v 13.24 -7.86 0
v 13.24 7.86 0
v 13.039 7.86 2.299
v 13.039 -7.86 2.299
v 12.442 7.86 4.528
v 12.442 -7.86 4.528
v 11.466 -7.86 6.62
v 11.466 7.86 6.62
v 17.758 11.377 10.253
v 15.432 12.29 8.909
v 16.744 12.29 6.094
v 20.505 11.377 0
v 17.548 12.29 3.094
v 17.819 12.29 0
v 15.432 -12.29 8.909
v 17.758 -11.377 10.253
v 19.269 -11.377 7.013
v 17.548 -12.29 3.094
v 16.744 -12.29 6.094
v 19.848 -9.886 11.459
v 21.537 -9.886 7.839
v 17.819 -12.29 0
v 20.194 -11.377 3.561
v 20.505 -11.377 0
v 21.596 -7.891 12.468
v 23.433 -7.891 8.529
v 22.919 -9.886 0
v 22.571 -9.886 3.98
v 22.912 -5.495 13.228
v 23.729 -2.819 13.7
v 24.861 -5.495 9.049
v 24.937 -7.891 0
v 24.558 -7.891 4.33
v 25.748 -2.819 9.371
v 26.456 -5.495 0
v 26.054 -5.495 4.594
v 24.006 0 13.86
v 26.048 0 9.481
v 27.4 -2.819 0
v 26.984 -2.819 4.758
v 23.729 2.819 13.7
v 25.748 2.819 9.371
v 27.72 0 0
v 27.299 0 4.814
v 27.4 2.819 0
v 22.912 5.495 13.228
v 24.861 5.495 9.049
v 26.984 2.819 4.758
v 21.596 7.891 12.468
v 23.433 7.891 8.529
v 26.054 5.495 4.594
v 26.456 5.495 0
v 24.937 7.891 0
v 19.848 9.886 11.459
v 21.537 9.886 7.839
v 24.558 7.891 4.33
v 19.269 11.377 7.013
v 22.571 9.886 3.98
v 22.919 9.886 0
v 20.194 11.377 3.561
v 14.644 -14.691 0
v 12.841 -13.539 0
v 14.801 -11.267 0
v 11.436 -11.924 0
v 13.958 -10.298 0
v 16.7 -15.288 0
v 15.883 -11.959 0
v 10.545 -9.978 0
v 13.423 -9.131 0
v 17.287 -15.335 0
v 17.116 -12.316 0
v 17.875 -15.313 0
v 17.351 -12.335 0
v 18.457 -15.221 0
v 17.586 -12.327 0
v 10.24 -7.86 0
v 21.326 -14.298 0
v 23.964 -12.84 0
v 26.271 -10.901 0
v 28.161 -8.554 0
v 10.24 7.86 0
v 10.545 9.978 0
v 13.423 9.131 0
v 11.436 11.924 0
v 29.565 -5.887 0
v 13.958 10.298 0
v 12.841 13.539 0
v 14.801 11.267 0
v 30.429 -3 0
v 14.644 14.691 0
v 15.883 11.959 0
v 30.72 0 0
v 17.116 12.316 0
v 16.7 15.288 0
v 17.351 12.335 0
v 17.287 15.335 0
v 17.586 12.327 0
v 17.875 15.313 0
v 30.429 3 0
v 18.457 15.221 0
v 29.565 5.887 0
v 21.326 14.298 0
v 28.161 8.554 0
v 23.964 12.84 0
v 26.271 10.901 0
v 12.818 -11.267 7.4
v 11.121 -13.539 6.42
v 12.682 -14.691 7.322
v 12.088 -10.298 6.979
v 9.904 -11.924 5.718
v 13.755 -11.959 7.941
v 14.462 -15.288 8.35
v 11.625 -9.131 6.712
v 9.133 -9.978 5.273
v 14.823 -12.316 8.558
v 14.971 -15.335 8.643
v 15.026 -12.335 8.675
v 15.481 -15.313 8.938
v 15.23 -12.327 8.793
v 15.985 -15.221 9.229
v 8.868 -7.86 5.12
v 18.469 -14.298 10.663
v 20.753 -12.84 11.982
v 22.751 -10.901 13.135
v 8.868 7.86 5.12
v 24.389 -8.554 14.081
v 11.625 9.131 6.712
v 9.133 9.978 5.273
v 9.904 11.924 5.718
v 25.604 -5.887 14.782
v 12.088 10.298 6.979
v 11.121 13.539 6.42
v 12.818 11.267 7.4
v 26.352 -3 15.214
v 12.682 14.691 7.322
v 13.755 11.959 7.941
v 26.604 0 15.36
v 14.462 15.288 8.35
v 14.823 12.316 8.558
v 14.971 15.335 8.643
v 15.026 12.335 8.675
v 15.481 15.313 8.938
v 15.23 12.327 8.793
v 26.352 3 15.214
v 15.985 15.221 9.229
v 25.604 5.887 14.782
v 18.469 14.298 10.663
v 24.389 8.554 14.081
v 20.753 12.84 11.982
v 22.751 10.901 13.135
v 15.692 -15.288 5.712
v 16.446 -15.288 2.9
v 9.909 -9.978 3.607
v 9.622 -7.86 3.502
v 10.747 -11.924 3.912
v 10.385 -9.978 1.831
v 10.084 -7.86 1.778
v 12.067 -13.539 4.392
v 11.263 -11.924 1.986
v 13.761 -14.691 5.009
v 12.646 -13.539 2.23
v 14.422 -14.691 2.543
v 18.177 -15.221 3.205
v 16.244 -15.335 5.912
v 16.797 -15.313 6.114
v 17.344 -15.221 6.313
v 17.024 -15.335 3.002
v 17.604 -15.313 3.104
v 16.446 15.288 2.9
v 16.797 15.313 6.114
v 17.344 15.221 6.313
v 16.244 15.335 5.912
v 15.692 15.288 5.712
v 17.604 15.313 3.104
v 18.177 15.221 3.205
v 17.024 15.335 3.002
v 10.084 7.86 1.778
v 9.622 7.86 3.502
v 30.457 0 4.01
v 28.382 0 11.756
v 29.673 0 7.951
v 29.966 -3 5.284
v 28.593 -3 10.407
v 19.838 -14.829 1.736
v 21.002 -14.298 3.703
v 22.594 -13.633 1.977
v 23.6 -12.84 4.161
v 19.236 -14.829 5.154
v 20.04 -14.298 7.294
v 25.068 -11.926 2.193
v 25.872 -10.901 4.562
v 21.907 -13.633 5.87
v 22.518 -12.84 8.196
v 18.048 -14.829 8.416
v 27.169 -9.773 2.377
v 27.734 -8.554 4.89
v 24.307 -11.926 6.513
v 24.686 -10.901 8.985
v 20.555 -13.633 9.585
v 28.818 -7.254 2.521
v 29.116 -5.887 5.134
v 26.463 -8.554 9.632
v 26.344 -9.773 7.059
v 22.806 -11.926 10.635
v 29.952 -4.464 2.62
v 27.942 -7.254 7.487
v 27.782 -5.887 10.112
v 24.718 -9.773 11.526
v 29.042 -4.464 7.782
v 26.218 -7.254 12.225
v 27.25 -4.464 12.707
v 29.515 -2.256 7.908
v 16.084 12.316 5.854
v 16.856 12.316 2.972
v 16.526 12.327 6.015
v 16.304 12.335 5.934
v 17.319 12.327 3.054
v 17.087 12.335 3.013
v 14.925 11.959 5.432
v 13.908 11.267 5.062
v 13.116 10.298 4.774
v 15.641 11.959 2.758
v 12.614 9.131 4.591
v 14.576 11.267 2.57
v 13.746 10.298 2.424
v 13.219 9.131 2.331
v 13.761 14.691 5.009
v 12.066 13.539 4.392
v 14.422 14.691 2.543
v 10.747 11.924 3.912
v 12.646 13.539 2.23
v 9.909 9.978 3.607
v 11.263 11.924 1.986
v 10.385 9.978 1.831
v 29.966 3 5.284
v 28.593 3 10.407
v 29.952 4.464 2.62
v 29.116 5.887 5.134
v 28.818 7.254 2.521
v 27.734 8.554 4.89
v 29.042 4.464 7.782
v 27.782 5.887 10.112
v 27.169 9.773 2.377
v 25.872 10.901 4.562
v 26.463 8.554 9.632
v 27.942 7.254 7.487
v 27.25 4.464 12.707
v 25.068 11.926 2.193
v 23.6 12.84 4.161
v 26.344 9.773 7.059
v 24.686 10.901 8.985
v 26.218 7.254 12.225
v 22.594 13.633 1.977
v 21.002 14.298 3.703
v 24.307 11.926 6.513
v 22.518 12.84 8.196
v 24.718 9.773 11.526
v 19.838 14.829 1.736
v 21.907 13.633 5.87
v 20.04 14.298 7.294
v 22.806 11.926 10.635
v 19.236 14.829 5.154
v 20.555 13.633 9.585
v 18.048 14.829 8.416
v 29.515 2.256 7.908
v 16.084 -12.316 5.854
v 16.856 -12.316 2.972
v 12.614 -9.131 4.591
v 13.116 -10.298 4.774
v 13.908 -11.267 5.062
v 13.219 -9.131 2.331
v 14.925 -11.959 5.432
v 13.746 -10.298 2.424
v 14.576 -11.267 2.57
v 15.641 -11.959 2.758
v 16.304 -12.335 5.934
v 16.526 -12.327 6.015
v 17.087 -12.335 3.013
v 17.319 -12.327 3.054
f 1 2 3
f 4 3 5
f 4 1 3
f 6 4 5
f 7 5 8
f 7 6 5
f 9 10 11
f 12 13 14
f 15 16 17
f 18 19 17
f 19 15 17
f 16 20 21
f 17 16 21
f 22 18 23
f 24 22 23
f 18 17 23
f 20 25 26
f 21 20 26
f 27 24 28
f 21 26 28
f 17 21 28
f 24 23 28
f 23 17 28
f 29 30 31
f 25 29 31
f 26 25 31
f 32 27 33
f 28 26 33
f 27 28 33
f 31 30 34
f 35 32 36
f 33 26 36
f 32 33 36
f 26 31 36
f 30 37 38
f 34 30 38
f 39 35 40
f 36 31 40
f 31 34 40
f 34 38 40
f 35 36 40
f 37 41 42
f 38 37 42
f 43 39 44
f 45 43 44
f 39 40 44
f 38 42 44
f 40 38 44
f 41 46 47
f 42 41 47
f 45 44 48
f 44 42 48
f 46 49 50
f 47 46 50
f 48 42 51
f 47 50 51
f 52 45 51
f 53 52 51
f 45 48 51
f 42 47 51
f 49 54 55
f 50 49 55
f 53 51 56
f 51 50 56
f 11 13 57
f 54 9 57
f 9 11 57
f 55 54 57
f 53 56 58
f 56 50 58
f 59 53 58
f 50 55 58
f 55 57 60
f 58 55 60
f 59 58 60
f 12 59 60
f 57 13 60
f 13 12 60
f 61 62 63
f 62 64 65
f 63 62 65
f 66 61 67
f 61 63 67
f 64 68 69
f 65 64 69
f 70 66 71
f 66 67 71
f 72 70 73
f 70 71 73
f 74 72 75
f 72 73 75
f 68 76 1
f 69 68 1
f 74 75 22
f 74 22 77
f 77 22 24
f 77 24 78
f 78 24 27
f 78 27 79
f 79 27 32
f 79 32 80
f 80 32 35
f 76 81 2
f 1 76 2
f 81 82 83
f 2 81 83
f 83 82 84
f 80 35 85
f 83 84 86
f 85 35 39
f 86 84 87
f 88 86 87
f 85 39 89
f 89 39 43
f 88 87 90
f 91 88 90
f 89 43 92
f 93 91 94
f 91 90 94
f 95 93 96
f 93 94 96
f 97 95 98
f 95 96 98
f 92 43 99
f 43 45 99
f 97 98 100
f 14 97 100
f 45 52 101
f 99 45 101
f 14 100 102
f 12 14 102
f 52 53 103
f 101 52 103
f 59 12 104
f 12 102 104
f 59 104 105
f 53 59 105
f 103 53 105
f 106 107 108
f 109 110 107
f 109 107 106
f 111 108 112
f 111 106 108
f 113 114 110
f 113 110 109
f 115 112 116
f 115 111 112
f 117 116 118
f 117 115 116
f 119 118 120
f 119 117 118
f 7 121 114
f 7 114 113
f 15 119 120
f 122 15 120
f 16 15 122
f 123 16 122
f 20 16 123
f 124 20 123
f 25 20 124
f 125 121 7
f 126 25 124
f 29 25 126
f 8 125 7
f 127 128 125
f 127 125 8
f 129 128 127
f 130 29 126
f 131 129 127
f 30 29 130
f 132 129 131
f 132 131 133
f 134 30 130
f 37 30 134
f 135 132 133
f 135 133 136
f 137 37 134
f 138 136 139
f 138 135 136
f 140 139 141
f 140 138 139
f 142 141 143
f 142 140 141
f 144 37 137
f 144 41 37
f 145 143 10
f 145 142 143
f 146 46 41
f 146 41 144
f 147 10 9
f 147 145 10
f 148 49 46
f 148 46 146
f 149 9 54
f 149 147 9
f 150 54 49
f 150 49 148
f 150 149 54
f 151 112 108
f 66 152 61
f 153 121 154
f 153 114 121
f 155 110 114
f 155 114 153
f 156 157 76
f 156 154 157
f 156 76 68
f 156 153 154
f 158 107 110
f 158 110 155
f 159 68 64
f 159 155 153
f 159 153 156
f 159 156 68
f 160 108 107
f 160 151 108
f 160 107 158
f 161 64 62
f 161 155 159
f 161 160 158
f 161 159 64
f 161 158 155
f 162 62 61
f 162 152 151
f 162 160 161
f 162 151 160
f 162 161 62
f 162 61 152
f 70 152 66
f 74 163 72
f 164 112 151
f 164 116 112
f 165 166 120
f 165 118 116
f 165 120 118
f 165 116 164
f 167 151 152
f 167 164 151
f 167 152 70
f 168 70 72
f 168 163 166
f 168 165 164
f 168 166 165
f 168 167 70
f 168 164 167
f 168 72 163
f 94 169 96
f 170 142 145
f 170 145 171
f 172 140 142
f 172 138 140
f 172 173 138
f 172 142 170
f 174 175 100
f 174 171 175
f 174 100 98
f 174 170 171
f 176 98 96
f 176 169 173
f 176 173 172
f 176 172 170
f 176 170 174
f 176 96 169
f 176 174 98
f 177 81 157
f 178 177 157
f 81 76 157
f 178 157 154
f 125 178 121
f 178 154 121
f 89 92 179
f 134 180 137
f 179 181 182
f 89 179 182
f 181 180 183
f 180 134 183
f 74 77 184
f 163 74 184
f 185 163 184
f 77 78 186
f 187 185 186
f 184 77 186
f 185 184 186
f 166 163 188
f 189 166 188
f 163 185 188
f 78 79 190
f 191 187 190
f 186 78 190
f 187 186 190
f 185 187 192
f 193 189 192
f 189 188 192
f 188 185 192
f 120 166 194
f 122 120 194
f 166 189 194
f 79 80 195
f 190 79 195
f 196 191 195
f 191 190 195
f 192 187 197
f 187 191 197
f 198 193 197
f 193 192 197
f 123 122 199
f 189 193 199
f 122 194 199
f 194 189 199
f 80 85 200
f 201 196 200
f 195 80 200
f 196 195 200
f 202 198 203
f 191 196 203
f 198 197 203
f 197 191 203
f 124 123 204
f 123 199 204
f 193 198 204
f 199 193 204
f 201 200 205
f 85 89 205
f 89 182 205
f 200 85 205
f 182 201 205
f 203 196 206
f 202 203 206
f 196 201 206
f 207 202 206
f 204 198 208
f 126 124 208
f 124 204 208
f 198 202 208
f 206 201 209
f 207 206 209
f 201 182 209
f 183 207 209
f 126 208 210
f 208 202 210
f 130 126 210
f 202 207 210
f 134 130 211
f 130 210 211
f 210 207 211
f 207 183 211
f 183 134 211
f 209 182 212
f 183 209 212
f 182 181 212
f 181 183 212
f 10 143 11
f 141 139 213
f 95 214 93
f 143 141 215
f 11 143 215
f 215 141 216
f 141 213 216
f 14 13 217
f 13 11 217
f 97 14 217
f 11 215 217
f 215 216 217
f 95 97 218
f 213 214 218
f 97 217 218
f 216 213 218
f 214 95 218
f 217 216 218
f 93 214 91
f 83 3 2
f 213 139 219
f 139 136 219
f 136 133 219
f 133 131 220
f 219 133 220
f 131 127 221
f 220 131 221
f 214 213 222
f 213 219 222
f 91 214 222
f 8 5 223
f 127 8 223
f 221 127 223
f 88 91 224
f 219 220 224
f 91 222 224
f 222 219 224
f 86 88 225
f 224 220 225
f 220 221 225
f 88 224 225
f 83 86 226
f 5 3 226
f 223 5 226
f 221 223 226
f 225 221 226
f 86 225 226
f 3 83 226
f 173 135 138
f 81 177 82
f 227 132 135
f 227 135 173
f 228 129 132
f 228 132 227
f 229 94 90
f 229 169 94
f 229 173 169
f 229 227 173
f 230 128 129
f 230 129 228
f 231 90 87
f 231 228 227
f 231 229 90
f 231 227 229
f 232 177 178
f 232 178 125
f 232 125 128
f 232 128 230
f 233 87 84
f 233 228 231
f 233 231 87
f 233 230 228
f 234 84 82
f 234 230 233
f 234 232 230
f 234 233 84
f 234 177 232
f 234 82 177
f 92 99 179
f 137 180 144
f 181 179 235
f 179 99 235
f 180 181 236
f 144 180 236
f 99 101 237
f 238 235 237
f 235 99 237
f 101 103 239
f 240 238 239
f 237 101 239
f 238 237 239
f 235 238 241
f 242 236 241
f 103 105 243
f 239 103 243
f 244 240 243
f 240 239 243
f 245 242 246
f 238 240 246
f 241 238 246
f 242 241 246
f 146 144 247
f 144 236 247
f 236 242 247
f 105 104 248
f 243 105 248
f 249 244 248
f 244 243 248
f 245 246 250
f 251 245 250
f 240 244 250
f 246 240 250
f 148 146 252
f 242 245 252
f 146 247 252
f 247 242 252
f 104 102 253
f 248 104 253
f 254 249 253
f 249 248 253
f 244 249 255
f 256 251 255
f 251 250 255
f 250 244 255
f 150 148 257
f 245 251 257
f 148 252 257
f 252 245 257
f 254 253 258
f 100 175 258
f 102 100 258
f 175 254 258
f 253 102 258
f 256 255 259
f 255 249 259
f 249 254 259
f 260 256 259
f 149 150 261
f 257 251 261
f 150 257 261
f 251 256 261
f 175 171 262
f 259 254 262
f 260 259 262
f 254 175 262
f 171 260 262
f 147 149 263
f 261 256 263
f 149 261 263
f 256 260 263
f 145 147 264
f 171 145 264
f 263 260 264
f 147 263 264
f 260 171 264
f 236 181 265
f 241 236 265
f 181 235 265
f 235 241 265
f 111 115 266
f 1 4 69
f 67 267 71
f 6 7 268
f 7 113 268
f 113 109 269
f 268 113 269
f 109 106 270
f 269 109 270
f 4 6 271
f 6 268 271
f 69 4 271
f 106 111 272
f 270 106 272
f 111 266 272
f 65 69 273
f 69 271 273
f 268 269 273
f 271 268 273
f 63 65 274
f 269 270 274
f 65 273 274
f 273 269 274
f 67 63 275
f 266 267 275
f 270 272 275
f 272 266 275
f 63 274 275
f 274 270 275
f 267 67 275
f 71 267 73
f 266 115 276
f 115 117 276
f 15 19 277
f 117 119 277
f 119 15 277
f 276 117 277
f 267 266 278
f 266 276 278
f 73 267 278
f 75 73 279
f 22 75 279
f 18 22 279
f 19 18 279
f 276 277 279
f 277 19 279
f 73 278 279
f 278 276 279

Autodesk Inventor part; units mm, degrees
ref_plane "Work Plane2" through (0, 0, 0) normal (-0.2588, 0, -0.9659) x (0, 1, 0)
ref_plane "Work Plane1" through (-7, 0, -29.5697) normal (1, 0, 0) x (0, 0, -1)
ref_plane "YZ Plane" through (0, 0, 0) normal (1, 0, 0) x (0, 1, 0)
sketch "Sketch1" plane through (0, 0, 0) normal (0, 0, 1) x (1, 0, 0)
  line L0 (0, 0) -> (0, 15.36) construction
  line L1 (10.24, 7.86) -> (10.24, -7.86)
  line L2 (17.74, 15.36) -> (17.74, -15.36) construction
  arc A0 (16.6996, 15.2875) -> (10.24, 7.86) centre (17.74, 7.86) ccw
  arc A1 (10.24, -7.86) -> (16.6996, -15.2875) centre (17.74, -7.86) ccw
  arc A2 (18.4574, -15.2213) -> (18.4574, 15.2213) centre (15.1418, 0) ccw
  line L3 (0, 0) -> (51.4073, 0)
  arc A3 (18.4574, 15.2213) -> (16.6996, 15.2875) centre (17.3932, 10.3358) ccw
  arc A4 (16.6996, -15.2875) -> (18.4574, -15.2213) centre (17.3932, -10.3358) ccw
  arc A5 (17.8189, 12.29) -> (17.1158, 12.3165) centre (17.3932, 10.3358) ccw
  arc A6 (17.1158, 12.3165) -> (13.24, 7.86) centre (17.74, 7.86) ccw
  line L4 (13.24, 7.86) -> (13.24, -7.86)
  arc A7 (13.24, -7.86) -> (17.1158, -12.3165) centre (17.74, -7.86) ccw
  arc A8 (17.1158, -12.3165) -> (17.8189, -12.29) centre (17.3932, -10.3358) ccw
  arc A9 (17.8189, -12.29) -> (17.8189, 12.29) centre (15.1418, 0) ccw
  point P0 (10.24, 0)
  point P1 (30.72, 0)
  point P2 (17.74, 0)
  dimension "MaxHeight" = 15.36
  dimension "FlatHeightx2" = 15.72
  dimension "ID" = 20.48
  dimension "OD" = 61.44
  dimension "d5" = 30.72
  dimension "RadAtPeak" = 17.74
  dimension "d90" = 5
  dimension "d97" = 3
revolve "Revolution1" add sketch "Sketch1" angle 30 about axis through (0, 0, 0) along (0, -1, 0) contours A0 A3 A2 L3 A9 A5 A6 L4 L1 | L3 L4 A7 A8 A9 A2 A4 A1 L1
sketch "Sketch7" plane through (0, 0, 0) normal (0, 1, 0) x (-1, 0, 0)
  circle A0 centre (0, 0) radius 198.9616
sketch "Sketch8" plane through (0, 0, 0) normal (1, 0, 0) x (0, 1, 0)
  circle A0 centre (0, 0) radius 159.0195
sketch "Sketch9" plane through (0, 0, 0) normal (1, 0, 0) x (0, 0, -1)
  line L0 (74, 0) -> (35, 0) projected
  point P0 (0, 0)
  point P1 (-52.5, 0)
  point P2 (0, 0)
  point P3 (52.5, 0)
  dimension "d88" = 105
  dimension "d89" = 52.5
sketch "Sketch11" plane through (0, 0, 0) normal (1, 0, 0) x (0, 0, -1)
  arc A0 (-35, 25.9107) -> (-42.6927, 34.8921) centre (-44.0893, 25.9107) ccw projected
  line L0 (-35, 25.9107) -> (-35, 0) projected
  line L1 (-35, 0) -> (35, 0) projected
  arc A1 (-50.0415, 0) -> (-54.9585, 0) centre (-52.5, 0) ccw projected
  arc A2 (-50.0415, 0) -> (-54.9585, 0) centre (-37.5, 0) ccw projected
  arc A3 (-39.8678, 39.0634) -> (-73, 0) centre (-33.4058, 0) ccw
  arc A4 (-29.5697, 27.789) -> (-36.4391, 38.3935) centre (-44.0893, 25.9107) ccw
  line L2 (-29.5697, 27.789) -> (-29.5697, 0)
  line L3 (-35, 0) -> (35, 0) projected
  line L4 (-73, 0) -> (-29.5697, 0)
  arc A5 (-36.4391, 38.3935) -> (-39.8678, 39.0634) centre (-39.0518, 34.1304) ccw
  point P0 (0, 0)
  point P1 (-35, 0)
  point P2 (-29.5697, 0)
  point P3 (-54.9585, 0)
  point P4 (-50.0415, 0)
  dimension "d91" = 5
equation "\"d5\" = 2 * MaxHeight"
equation "\"d63_Copy\" = 35"
properties part number "L_20uH-Wedge" material "UHMW, White"
